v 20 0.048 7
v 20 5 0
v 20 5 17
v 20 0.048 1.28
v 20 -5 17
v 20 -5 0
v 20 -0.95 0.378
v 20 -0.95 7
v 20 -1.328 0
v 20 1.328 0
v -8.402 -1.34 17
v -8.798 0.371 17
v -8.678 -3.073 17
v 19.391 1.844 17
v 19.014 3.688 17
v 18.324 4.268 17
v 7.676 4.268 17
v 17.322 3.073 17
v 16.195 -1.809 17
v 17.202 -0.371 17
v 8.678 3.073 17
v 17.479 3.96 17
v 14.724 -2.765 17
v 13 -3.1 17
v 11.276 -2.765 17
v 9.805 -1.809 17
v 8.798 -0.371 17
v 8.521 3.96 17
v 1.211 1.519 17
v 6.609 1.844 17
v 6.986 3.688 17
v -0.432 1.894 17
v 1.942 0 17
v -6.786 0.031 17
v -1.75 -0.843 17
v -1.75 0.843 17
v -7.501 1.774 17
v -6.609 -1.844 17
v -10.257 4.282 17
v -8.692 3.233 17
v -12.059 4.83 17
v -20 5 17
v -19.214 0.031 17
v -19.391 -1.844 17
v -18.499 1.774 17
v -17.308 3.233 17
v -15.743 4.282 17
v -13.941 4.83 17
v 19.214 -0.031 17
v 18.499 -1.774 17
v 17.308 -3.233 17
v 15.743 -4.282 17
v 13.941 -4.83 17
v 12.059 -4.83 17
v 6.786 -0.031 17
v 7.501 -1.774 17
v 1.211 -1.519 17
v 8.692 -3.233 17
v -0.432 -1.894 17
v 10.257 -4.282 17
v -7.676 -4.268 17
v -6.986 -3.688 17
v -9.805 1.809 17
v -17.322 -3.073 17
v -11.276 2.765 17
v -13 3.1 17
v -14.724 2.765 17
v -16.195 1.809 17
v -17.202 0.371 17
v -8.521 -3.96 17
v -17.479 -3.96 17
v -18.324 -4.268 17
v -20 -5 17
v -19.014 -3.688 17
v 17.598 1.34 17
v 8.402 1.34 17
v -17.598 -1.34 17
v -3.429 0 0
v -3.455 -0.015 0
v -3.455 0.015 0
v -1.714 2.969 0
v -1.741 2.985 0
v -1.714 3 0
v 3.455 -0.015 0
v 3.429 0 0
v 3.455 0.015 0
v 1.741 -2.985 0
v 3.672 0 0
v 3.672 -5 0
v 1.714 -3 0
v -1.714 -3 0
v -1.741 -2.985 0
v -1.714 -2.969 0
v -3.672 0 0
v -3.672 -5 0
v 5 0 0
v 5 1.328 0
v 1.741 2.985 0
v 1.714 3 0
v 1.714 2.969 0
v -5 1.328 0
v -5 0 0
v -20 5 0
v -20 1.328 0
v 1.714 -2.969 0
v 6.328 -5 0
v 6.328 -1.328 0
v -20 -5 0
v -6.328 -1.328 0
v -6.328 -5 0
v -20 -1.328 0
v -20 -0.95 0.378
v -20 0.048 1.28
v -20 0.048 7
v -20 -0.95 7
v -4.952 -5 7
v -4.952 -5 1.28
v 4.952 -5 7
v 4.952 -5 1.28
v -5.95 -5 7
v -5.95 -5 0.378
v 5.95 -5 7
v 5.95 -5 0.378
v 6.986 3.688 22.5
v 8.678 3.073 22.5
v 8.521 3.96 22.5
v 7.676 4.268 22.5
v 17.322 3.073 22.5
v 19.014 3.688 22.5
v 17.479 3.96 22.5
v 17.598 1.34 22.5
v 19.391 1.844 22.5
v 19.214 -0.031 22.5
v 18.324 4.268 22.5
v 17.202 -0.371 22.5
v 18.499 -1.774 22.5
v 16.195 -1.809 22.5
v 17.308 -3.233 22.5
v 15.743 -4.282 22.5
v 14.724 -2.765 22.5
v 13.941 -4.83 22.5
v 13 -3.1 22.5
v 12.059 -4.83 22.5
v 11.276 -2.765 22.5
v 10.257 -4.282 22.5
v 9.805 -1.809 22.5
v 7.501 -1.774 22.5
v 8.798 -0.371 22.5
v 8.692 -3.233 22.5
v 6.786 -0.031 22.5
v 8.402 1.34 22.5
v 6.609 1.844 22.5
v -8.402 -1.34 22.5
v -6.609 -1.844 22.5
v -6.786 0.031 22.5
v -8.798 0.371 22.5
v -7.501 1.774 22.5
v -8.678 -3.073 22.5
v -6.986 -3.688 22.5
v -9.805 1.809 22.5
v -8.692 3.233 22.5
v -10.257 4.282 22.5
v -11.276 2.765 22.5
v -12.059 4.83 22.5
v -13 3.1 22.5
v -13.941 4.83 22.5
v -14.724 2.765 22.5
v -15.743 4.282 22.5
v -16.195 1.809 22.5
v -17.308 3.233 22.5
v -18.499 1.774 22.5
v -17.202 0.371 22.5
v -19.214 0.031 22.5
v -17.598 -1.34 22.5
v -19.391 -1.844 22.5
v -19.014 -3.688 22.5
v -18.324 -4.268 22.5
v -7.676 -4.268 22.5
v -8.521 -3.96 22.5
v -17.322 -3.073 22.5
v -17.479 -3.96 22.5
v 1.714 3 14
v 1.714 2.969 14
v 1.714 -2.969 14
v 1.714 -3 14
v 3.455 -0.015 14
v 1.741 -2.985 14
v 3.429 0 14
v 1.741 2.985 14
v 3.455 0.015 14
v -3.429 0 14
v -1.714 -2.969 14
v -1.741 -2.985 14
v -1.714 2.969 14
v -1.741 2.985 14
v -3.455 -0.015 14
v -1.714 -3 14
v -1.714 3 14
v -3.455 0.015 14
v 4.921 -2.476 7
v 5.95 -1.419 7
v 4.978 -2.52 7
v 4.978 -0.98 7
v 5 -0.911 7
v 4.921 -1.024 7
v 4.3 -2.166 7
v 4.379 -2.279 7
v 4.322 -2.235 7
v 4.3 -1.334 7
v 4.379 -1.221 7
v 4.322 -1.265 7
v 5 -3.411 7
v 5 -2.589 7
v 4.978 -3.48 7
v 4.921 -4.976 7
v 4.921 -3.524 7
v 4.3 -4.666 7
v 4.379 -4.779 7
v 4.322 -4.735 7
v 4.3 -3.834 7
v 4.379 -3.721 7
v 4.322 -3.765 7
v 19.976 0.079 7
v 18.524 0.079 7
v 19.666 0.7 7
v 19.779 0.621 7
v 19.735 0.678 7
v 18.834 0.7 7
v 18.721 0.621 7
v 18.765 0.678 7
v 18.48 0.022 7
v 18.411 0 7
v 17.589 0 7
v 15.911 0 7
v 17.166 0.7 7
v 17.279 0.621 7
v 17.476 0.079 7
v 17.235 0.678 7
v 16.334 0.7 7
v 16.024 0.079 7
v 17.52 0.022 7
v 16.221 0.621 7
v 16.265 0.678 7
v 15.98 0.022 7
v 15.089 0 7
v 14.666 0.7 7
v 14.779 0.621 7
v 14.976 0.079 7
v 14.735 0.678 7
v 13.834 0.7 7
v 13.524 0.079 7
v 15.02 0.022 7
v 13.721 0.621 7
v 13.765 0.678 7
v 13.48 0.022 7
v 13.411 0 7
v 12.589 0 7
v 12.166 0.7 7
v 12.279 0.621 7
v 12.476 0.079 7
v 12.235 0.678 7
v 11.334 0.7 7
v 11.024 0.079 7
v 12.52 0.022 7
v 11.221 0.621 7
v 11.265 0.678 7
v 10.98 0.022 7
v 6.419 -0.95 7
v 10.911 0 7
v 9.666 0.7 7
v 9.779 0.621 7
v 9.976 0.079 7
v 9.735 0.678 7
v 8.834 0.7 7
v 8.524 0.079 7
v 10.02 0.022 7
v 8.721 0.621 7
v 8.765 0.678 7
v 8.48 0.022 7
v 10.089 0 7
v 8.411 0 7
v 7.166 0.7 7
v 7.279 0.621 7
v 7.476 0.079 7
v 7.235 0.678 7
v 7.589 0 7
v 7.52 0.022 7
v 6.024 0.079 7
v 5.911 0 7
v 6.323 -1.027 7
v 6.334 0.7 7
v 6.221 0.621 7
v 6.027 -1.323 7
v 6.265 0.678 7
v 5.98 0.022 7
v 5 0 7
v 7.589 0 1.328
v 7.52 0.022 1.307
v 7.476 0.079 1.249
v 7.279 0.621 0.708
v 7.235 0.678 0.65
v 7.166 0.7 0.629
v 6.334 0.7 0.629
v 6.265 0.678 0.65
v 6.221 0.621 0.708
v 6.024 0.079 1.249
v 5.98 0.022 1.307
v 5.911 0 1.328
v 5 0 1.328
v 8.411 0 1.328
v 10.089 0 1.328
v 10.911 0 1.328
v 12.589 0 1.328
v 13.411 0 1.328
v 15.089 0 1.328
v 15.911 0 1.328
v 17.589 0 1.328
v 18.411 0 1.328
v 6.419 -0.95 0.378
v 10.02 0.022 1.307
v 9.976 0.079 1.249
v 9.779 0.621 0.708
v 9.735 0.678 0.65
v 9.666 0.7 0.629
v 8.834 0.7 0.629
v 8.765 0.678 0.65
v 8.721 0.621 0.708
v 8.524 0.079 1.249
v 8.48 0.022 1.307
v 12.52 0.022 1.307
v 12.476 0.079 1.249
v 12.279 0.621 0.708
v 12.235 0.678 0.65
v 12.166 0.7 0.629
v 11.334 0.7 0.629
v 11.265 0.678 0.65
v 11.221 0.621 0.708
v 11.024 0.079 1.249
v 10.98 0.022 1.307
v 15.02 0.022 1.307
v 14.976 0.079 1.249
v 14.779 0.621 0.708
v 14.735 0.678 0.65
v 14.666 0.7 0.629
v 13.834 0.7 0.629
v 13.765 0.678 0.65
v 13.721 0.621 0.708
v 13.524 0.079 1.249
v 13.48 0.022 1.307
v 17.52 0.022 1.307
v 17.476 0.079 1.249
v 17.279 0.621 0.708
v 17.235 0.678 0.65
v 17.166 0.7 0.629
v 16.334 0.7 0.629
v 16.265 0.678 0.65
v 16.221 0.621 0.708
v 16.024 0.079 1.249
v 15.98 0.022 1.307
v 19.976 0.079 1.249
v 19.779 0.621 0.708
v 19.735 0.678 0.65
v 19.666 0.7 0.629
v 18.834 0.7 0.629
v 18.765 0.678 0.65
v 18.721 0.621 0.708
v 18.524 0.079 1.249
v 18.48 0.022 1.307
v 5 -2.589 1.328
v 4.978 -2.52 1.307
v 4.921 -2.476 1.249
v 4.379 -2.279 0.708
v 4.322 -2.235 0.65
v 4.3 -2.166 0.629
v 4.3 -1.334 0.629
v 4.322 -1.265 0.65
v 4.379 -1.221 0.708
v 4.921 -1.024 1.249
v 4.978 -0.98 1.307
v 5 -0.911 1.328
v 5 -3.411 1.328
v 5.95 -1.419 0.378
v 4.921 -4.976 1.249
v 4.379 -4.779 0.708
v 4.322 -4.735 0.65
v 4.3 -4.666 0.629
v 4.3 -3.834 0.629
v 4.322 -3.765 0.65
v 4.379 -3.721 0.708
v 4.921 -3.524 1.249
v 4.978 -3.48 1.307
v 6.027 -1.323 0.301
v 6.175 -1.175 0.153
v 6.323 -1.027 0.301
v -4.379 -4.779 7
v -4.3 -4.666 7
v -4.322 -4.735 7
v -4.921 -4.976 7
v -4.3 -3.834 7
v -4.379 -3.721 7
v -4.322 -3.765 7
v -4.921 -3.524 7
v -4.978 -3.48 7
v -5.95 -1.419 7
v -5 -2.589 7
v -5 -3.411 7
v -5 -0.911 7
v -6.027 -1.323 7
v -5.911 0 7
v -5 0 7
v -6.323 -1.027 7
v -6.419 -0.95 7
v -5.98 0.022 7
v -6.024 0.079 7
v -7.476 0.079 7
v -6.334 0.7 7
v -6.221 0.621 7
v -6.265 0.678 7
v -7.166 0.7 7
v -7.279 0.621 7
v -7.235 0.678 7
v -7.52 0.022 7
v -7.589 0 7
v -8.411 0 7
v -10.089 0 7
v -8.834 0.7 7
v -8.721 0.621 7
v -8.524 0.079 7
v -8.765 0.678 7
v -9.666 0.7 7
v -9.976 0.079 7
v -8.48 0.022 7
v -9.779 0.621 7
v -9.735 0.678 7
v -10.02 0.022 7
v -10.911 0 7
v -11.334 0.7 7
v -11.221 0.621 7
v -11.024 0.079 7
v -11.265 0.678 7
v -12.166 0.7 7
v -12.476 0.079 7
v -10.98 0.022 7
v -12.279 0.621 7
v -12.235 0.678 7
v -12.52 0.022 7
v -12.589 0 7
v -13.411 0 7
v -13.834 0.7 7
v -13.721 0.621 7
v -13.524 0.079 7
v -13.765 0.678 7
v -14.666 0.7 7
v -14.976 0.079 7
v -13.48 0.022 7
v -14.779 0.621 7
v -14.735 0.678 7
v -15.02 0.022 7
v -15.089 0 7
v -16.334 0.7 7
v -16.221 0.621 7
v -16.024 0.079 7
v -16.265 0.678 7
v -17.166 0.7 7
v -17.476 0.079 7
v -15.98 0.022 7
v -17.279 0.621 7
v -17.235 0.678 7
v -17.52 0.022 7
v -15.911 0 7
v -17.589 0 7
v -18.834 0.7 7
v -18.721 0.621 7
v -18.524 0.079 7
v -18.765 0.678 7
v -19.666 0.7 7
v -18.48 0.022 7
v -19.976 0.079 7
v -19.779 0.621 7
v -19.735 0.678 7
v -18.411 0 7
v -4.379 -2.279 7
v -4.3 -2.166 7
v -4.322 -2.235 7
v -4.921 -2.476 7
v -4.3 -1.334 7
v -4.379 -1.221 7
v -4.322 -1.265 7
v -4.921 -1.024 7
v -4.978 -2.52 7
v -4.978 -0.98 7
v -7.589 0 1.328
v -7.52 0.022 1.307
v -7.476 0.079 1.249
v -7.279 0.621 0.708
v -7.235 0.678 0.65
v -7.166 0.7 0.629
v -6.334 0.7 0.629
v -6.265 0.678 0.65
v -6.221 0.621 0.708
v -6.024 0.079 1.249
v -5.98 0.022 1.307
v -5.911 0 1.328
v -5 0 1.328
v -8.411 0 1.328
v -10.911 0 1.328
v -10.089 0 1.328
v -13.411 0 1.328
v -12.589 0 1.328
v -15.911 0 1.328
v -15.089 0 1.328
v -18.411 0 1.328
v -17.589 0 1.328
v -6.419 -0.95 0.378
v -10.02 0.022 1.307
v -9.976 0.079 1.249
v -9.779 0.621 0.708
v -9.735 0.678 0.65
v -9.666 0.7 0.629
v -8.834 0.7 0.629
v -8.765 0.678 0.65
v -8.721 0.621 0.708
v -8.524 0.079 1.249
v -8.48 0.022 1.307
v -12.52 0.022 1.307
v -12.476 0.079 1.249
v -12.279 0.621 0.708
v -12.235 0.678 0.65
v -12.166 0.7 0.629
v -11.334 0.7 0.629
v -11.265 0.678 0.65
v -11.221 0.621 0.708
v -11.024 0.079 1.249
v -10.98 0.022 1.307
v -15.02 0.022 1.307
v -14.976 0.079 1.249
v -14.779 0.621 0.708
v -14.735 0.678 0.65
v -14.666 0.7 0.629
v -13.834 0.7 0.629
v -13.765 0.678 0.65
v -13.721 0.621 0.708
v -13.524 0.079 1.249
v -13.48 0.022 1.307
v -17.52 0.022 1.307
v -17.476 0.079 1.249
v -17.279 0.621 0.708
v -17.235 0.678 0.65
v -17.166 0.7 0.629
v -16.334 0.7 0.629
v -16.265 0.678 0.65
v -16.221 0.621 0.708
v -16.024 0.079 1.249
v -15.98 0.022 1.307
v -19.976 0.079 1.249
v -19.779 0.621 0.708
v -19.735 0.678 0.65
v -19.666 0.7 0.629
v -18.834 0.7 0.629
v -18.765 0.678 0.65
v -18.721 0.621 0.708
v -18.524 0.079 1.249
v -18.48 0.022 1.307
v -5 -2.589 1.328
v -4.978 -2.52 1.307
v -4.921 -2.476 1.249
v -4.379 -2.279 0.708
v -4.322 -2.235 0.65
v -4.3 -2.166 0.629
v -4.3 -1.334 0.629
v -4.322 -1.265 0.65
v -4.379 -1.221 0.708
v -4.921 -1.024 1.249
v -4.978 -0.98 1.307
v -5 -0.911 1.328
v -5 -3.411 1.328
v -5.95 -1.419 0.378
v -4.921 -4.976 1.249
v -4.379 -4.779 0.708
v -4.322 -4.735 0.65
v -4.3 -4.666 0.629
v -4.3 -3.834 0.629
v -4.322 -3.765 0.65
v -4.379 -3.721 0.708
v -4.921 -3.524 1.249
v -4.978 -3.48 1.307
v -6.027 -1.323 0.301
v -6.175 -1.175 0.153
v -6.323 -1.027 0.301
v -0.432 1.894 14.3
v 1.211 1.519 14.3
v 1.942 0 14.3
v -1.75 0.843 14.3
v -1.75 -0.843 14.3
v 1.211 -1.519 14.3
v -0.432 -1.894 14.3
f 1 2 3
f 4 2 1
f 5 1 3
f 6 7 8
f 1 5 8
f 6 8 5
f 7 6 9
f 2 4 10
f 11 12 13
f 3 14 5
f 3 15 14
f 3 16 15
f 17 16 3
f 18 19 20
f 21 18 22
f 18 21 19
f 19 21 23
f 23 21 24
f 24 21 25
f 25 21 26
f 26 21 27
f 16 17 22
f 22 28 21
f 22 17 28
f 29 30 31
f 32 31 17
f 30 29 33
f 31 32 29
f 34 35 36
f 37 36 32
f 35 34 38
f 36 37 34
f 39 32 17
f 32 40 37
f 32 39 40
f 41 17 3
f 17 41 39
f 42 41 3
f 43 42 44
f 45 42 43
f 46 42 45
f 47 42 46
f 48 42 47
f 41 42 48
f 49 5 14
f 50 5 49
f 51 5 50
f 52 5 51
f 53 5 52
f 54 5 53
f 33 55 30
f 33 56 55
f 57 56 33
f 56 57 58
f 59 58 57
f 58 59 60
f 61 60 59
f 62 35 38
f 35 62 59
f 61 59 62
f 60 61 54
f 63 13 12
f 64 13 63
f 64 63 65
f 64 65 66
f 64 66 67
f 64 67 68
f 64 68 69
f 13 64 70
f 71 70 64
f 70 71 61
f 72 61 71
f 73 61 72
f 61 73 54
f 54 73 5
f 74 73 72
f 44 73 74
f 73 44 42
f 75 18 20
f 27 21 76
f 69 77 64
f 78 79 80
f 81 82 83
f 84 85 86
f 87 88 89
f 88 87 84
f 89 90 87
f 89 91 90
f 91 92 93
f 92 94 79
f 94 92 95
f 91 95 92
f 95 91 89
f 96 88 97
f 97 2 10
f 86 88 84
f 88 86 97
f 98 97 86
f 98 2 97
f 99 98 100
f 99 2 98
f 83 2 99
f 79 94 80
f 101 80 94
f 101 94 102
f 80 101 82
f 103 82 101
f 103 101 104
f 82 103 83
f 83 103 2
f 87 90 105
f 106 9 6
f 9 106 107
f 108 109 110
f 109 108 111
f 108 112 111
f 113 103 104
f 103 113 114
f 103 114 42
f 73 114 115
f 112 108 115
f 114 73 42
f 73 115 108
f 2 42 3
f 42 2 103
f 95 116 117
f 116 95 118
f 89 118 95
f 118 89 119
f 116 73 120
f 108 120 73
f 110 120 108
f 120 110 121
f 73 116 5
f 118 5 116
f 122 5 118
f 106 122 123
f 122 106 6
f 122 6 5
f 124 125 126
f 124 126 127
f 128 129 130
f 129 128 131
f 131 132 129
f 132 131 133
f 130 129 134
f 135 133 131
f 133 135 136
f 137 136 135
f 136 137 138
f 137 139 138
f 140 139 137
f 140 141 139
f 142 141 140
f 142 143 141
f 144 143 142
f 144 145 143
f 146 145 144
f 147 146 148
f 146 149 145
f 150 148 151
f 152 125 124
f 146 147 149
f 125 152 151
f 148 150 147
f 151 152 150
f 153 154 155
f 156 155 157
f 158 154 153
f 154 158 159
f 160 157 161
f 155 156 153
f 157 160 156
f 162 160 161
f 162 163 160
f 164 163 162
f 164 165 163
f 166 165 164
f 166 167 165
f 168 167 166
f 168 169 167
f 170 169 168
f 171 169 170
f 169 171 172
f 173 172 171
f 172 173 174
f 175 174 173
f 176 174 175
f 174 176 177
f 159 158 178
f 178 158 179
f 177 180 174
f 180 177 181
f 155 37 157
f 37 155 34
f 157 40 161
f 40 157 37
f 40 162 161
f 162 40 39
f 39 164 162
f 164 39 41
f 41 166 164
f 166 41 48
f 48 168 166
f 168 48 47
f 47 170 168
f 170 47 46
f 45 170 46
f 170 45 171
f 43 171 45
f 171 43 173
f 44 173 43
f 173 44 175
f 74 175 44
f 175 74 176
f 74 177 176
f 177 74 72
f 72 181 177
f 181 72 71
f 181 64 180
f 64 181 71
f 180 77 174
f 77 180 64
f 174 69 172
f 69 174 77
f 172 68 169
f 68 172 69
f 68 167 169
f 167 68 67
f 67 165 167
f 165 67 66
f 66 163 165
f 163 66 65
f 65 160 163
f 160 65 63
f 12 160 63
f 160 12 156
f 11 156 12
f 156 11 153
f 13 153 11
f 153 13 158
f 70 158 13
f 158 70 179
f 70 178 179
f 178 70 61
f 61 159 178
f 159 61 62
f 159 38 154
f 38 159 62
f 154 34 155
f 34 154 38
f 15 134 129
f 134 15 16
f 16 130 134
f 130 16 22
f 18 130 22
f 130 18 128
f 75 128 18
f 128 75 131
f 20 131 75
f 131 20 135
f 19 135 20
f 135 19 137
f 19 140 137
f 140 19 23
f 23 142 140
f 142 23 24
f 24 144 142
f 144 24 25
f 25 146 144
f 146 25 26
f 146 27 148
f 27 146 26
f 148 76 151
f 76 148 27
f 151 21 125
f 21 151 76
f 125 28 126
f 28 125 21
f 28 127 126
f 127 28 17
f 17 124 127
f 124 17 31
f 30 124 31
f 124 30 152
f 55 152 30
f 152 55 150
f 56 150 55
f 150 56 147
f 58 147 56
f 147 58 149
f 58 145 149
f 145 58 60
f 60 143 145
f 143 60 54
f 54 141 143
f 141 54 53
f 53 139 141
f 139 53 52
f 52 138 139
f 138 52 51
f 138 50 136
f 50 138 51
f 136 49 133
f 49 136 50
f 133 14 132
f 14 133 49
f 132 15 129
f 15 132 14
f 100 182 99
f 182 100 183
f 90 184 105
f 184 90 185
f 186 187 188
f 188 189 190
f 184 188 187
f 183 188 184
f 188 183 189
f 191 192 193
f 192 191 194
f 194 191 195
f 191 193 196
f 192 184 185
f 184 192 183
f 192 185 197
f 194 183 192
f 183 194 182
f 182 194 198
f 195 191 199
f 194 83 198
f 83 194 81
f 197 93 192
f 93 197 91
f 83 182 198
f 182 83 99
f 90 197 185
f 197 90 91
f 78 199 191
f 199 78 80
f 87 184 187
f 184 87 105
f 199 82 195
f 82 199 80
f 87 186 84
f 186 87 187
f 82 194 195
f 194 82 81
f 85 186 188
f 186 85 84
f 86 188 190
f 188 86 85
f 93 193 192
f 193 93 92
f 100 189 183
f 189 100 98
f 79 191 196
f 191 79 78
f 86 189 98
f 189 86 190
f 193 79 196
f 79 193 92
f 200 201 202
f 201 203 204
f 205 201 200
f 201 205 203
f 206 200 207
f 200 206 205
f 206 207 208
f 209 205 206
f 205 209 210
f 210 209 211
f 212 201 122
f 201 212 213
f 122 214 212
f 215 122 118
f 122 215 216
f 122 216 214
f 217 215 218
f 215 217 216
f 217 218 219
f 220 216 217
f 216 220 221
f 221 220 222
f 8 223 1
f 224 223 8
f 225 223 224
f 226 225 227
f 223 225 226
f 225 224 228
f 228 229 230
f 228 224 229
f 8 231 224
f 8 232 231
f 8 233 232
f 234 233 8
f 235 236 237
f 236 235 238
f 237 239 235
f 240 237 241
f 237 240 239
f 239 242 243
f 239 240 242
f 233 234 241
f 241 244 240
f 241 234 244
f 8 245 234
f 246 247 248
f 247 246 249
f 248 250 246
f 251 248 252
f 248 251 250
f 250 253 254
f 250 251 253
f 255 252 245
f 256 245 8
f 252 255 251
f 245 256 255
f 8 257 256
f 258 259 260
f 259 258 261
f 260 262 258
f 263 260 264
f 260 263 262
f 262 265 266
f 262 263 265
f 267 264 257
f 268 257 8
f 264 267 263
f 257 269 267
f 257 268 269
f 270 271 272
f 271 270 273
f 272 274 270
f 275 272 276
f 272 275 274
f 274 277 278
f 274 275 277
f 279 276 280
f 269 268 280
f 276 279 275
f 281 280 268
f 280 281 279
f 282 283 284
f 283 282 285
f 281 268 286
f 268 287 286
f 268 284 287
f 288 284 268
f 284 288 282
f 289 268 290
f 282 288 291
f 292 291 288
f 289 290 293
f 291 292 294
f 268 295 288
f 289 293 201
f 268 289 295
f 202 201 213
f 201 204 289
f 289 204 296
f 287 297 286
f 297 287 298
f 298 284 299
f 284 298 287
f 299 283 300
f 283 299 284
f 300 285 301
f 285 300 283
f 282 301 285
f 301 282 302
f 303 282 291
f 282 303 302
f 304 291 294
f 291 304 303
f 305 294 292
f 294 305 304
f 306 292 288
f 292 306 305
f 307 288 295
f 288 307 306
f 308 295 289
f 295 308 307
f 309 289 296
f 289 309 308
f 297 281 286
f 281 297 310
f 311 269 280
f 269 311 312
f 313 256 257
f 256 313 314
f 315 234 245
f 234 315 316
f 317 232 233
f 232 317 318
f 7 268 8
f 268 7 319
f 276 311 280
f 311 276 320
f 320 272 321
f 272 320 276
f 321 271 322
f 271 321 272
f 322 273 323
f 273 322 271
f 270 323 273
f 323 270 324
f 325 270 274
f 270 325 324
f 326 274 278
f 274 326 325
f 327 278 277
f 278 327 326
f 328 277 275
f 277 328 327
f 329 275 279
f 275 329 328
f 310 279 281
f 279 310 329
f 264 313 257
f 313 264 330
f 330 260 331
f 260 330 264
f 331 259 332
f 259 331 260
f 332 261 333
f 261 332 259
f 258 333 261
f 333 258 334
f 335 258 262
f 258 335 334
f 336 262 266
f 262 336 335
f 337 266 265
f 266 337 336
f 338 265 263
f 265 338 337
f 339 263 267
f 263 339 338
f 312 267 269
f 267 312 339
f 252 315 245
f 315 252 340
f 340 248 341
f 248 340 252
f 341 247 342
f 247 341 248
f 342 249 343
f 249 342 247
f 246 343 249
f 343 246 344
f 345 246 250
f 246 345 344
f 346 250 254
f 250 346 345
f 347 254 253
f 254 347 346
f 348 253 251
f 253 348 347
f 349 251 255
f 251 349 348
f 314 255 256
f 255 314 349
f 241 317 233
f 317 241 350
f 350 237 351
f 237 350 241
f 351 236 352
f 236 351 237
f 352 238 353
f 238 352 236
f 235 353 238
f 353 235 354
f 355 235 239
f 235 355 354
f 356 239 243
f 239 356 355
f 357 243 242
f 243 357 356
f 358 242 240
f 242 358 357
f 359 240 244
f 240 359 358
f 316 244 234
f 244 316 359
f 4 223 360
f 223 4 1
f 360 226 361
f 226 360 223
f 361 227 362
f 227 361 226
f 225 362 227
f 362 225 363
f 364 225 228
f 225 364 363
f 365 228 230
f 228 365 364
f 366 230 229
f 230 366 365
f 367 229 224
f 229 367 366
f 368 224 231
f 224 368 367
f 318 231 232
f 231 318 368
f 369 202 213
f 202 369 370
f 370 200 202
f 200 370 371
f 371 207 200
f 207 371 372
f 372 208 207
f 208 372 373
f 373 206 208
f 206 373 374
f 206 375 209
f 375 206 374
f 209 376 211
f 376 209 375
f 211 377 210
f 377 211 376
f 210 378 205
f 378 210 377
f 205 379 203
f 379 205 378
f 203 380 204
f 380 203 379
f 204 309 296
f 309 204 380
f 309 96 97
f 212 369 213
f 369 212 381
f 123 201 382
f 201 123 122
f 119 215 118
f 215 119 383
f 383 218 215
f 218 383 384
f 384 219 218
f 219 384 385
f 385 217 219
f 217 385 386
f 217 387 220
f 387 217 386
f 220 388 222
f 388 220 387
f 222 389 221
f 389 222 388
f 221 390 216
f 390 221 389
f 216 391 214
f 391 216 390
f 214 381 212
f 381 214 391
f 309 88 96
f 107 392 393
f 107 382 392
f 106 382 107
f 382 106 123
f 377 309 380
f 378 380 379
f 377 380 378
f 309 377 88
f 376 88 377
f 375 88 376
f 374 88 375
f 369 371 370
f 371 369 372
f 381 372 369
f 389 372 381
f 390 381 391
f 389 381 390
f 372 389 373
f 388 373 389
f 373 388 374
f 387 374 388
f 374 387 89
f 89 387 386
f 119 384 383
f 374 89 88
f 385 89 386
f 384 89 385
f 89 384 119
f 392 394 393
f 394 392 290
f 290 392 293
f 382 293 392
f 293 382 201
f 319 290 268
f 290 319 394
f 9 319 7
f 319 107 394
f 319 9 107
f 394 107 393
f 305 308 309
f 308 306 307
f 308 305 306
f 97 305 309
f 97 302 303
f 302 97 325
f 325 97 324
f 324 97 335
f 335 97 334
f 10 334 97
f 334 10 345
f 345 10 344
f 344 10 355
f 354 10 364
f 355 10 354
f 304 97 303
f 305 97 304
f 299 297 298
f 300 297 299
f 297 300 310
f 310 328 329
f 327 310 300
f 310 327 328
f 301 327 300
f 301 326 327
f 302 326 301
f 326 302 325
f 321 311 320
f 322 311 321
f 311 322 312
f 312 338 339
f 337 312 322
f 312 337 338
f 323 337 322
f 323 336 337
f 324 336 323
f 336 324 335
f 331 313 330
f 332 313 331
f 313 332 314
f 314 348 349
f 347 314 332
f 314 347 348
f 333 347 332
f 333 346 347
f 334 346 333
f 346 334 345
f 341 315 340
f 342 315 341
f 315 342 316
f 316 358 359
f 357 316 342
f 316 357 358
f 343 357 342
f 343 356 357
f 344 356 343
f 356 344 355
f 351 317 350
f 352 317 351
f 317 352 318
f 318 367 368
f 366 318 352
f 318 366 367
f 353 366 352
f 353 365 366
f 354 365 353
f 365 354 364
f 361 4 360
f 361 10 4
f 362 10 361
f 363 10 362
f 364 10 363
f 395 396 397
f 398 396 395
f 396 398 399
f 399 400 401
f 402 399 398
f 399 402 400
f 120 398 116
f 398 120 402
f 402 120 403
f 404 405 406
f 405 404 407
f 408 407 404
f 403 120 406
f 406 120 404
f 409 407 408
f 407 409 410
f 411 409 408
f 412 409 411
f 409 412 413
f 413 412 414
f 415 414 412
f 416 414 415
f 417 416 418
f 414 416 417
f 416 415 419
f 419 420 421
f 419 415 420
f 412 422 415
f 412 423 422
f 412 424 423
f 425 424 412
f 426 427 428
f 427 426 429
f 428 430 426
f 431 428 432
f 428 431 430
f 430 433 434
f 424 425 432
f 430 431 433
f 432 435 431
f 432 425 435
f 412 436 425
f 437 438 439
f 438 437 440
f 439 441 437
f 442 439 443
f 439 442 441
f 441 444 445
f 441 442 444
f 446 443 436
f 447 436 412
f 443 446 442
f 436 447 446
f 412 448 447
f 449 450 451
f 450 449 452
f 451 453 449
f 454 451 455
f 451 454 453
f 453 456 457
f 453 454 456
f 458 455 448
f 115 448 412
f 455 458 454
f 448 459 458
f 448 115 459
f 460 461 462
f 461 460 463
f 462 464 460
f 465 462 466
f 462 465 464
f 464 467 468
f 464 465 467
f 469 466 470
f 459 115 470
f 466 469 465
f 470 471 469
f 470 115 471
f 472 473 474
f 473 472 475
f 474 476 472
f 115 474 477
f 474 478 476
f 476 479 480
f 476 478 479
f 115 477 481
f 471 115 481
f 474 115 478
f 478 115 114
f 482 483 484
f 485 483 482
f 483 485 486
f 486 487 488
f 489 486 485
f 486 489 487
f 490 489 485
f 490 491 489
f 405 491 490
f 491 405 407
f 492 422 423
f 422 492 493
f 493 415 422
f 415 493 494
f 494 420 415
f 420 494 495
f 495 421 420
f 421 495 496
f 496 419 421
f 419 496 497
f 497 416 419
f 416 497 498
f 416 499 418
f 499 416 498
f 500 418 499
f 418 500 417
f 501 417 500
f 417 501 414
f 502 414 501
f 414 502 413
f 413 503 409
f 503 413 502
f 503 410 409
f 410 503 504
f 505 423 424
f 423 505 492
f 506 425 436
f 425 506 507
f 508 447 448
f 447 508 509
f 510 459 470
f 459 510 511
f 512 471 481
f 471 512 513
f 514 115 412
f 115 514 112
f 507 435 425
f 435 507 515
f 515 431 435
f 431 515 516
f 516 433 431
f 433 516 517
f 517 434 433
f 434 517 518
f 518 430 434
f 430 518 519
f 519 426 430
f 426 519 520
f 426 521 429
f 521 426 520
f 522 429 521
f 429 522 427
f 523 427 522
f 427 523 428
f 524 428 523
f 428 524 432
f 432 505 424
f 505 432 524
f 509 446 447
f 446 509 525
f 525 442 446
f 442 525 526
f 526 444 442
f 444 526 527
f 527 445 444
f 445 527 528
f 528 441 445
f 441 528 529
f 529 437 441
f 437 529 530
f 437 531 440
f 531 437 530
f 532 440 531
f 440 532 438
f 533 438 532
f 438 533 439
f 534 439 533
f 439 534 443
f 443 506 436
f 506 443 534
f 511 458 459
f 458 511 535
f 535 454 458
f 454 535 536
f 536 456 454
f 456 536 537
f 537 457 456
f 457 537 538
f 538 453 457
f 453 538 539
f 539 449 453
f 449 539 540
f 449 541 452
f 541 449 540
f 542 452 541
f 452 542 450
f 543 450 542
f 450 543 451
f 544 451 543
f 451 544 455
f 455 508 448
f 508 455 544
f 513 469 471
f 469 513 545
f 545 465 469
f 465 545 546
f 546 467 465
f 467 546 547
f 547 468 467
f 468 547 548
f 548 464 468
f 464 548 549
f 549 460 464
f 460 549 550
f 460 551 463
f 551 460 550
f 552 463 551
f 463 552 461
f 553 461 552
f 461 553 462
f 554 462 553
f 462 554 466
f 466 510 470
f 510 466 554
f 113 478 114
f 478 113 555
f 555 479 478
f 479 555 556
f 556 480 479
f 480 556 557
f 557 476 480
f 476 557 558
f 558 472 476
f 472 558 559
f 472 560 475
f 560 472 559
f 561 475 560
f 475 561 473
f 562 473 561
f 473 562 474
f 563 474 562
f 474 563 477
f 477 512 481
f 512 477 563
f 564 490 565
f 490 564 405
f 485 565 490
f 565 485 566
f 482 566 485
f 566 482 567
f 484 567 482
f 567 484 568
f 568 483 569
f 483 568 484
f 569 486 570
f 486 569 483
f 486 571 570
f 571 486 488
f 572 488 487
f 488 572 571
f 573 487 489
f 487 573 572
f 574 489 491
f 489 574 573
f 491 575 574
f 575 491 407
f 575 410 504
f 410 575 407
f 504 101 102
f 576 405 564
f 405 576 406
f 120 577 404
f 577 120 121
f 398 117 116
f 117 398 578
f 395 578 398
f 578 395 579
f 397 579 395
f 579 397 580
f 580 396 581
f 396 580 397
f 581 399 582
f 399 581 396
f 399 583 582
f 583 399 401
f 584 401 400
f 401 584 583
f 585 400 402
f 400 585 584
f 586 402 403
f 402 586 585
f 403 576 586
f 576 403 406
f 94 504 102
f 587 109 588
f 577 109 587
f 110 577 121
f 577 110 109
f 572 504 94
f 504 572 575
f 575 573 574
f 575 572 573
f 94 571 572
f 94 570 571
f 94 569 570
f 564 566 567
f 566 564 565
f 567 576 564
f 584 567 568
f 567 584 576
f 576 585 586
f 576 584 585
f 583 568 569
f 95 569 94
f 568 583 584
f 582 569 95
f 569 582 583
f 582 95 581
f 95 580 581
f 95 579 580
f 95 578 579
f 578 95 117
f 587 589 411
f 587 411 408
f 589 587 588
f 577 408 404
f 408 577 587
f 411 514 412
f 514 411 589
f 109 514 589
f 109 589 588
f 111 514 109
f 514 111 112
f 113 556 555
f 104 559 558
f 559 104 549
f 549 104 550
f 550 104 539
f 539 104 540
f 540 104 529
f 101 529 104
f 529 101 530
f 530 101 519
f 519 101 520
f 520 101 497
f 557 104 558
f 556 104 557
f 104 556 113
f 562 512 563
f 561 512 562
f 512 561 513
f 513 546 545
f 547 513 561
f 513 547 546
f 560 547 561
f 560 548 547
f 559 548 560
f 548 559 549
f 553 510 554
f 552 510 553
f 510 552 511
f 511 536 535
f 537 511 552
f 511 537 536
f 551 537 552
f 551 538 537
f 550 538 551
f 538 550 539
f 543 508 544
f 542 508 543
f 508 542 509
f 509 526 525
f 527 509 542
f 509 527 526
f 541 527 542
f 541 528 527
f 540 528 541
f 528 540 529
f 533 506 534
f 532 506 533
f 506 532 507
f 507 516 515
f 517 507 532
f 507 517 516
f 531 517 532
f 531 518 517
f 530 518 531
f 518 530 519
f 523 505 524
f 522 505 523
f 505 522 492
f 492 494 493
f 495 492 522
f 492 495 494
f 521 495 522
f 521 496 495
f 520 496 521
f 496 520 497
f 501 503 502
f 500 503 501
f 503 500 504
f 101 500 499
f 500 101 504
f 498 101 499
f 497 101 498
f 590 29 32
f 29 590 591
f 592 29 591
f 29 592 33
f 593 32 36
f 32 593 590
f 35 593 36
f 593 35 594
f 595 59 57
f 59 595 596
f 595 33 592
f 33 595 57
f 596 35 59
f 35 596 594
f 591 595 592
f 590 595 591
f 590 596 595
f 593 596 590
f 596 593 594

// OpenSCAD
// file: timing_belts.scad
/*Parametric belting section generator 
By - The DoomMeister
Derived from http://www.thingiverse.com/thing:16627 by Droftarts
*/


//Variables
tooth_profile = "MXL"; // "T2.5", "T5" , "T10"
belt_width = 4;
n = 20;

//Draw
/*
belt_length(profile = tooth_profile, belt_width = 10, n = 30);
translate([0,0,-20])color("red")belt_length(profile = "T5", belt_width = 10, n = 15);
translate([0,0,-40])color("green")belt_length(profile = "T10", belt_width = 10, n = 8);
*/

//Outer Module
module belt_length(profile = "T2.5", belt_width = 6, n = 10, backing_thickness_plus=0)
{

			if ( profile == "T2.5" ) 
				{ 
					_belt_length(
						profile=profile, 
						n = n, 
						belt_width = belt_width,
						tooth_pitch = 2.5,
						backing_thickness = 0.6+backing_thickness_plus
						);
				}
			if ( profile == "T5" ) 
				{ 
					_belt_length(
						profile=profile, 
						n = n, 
						belt_width = belt_width,
						tooth_pitch = 5,
						backing_thickness = 1+backing_thickness_plus
						);
				}
			if ( profile == "T10" ) 
				{ 
					_belt_length(
						profile=profile, 
						n = n, 
						belt_width = belt_width,
						tooth_pitch = 10,
						backing_thickness = 2+backing_thickness_plus
						);
				}
			if ( profile == "MXL" ) 
				{ 
					_belt_length(
						profile=profile, 
						n = n, 
						belt_width = belt_width,
						tooth_pitch = 2.032,
						backing_thickness = 0.64+backing_thickness_plus
						);
				}


}



//inner module
module _belt_length(profile = "T2.5", n = 10, belt_width = 5, tooth_pitch = 2.5, backing_thickness = 0.6)
{

for( i = [0:n])
	{
		union(){

			if ( profile == "T2.5" ) { translate([tooth_pitch*i,0,0])T2_5(width = belt_width);}
			if ( profile == "T5" ) { translate([tooth_pitch*i,0,0])T5(width = belt_width);}
			if ( profile == "T10" ) { translate([tooth_pitch*i,0,0])T10(width = belt_width);}
			if ( profile == "MXL" ) { translate([tooth_pitch*i,0,0])MXL(width = belt_width);}
			translate([(tooth_pitch*i)-(tooth_pitch/2),-backing_thickness,0])cube([tooth_pitch,backing_thickness,belt_width]);
		}
	}
}



//Tooth Form modules - Taken from http://www.thingiverse.com/thing:1662
module T2_5(width = 2)
	{
	linear_extrude(height=width) polygon([[-0.839258,-0.5],[-0.839258,0],[-0.770246,0.021652],[-0.726369,0.079022],[-0.529167,0.620889],[-0.485025,0.67826],[-0.416278,0.699911],[0.416278,0.699911],[0.484849,0.67826],[0.528814,0.620889],[0.726369,0.079022],[0.770114,0.021652],[0.839258,0],[0.839258,-0.5]]);
	}

module T5(width = 2)
	{
	linear_extrude(height=width) polygon([[-1.632126,-0.5],[-1.632126,0],[-1.568549,0.004939],[-1.507539,0.019367],[-1.450023,0.042686],[-1.396912,0.074224],[-1.349125,0.113379],[-1.307581,0.159508],[-1.273186,0.211991],[-1.246868,0.270192],[-1.009802,0.920362],[-0.983414,0.978433],[-0.949018,1.030788],[-0.907524,1.076798],[-0.859829,1.115847],[-0.80682,1.147314],[-0.749402,1.170562],[-0.688471,1.184956],[-0.624921,1.189895],[0.624971,1.189895],[0.688622,1.184956],[0.749607,1.170562],[0.807043,1.147314],[0.860055,1.115847],[0.907754,1.076798],[0.949269,1.030788],[0.9837,0.978433],[1.010193,0.920362],[1.246907,0.270192],[1.273295,0.211991],[1.307726,0.159508],[1.349276,0.113379],[1.397039,0.074224],[1.450111,0.042686],[1.507589,0.019367],[1.568563,0.004939],[1.632126,0],[1.632126,-0.5]]);
	}

module T10(width = 2)
	{
	linear_extrude(height=width) polygon([[-3.06511,-1],[-3.06511,0],[-2.971998,0.007239],[-2.882718,0.028344],[-2.79859,0.062396],[-2.720931,0.108479],[-2.651061,0.165675],[-2.590298,0.233065],[-2.539962,0.309732],[-2.501371,0.394759],[-1.879071,2.105025],[-1.840363,2.190052],[-1.789939,2.266719],[-1.729114,2.334109],[-1.659202,2.391304],[-1.581518,2.437387],[-1.497376,2.47144],[-1.408092,2.492545],[-1.314979,2.499784],[1.314979,2.499784],[1.408091,2.492545],[1.497371,2.47144],[1.581499,2.437387],[1.659158,2.391304],[1.729028,2.334109],[1.789791,2.266719],[1.840127,2.190052],[1.878718,2.105025],[2.501018,0.394759],[2.539726,0.309732],[2.59015,0.233065],[2.650975,0.165675],[2.720887,0.108479],[2.798571,0.062396],[2.882713,0.028344],[2.971997,0.007239],[3.06511,0],[3.06511,-1]]);
	}

module MXL(width = 2)
	{
	linear_extrude(height=width) polygon([[-0.660421,-0.5],[-0.660421,0],[-0.621898,0.006033],[-0.587714,0.023037],[-0.560056,0.049424],[-0.541182,0.083609],[-0.417357,0.424392],[-0.398413,0.458752],[-0.370649,0.48514],[-0.336324,0.502074],[-0.297744,0.508035],[0.297744,0.508035],[0.336268,0.502074],[0.370452,0.48514],[0.39811,0.458752],[0.416983,0.424392],[0.540808,0.083609],[0.559752,0.049424],[0.587516,0.023037],[0.621841,0.006033],[0.660421,0],[0.660421,-0.5]]);
	}
// file: util.scad
module hexagon(size, h, center=false) {
    boxWidth=size/1.75;
    translate ([0, 0, center ? 0 : h/2]) {
        union(){
            cube([boxWidth, size, h], center=true);
            rotate([0,0,60]) cube([boxWidth, size, h], center=true);
            rotate([0,0,-60]) cube([boxWidth, size, h], center=true);
        }
    }
}

module polyhole(d, h, center=false, d1=-1, d2=-1) {
    n = max(round(2 * ((d1<0 || d2<0) ? d : max(d1, d2))),3);
    if (d1<0 || d2<0) {
        cylinder(h = h, r = (d / 2) / cos (180 / n), center=center, $fn = n);
    } else {
        cylinder(h = h, r1 = (d1 / 2) / cos (180 / n), r2 = (d2 / 2) / cos (180 / n), center=center, $fn = n);
    }
}
// main file
include <Kikai Woody.scad>;

!union() {
    timing_belt_trap_y();
} 
